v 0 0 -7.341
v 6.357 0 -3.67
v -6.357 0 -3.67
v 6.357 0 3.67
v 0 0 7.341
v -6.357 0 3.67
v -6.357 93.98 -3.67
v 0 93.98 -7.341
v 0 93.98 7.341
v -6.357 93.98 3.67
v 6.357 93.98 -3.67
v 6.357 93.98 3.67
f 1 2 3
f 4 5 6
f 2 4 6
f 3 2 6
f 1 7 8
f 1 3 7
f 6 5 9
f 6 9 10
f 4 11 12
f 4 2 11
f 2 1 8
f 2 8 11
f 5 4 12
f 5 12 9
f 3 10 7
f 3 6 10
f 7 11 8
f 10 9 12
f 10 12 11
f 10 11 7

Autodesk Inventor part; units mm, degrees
ref_plane "YZ Plane" through (0, 0, 0) normal (1, 0, 0) x (0, 1, 0)
ref_plane "XZ Plane" through (0, 0, 0) normal (0, 1, 0) x (-1, 0, 0)
ref_plane "XY Plane" through (0, 0, 0) normal (0, 0, 1) x (1, 0, 0)
sketch "Sketch1" plane through (0, 0, 0) normal (0, 1, 0) x (-1, 0, 0)
  line L0 (0, -7.3406) -> (-6.3571, -3.6703)
  line L1 (-6.3571, -3.6703) -> (-6.3571, 3.6703)
  line L2 (-6.3571, 3.6703) -> (0, 7.3406)
  line L3 (0, 7.3406) -> (6.3571, 3.6703)
  line L4 (6.3571, 3.6703) -> (6.3571, -3.6703)
  line L5 (6.3571, -3.6703) -> (0, -7.3406)
  point P0 (0, 0)
  point P1 (0, 0)
  dimension "d0" = 7.3406
extrude "Extrusion1" add sketch "Sketch1" along normal blind 93.98
properties part number "drive hex shaft"
